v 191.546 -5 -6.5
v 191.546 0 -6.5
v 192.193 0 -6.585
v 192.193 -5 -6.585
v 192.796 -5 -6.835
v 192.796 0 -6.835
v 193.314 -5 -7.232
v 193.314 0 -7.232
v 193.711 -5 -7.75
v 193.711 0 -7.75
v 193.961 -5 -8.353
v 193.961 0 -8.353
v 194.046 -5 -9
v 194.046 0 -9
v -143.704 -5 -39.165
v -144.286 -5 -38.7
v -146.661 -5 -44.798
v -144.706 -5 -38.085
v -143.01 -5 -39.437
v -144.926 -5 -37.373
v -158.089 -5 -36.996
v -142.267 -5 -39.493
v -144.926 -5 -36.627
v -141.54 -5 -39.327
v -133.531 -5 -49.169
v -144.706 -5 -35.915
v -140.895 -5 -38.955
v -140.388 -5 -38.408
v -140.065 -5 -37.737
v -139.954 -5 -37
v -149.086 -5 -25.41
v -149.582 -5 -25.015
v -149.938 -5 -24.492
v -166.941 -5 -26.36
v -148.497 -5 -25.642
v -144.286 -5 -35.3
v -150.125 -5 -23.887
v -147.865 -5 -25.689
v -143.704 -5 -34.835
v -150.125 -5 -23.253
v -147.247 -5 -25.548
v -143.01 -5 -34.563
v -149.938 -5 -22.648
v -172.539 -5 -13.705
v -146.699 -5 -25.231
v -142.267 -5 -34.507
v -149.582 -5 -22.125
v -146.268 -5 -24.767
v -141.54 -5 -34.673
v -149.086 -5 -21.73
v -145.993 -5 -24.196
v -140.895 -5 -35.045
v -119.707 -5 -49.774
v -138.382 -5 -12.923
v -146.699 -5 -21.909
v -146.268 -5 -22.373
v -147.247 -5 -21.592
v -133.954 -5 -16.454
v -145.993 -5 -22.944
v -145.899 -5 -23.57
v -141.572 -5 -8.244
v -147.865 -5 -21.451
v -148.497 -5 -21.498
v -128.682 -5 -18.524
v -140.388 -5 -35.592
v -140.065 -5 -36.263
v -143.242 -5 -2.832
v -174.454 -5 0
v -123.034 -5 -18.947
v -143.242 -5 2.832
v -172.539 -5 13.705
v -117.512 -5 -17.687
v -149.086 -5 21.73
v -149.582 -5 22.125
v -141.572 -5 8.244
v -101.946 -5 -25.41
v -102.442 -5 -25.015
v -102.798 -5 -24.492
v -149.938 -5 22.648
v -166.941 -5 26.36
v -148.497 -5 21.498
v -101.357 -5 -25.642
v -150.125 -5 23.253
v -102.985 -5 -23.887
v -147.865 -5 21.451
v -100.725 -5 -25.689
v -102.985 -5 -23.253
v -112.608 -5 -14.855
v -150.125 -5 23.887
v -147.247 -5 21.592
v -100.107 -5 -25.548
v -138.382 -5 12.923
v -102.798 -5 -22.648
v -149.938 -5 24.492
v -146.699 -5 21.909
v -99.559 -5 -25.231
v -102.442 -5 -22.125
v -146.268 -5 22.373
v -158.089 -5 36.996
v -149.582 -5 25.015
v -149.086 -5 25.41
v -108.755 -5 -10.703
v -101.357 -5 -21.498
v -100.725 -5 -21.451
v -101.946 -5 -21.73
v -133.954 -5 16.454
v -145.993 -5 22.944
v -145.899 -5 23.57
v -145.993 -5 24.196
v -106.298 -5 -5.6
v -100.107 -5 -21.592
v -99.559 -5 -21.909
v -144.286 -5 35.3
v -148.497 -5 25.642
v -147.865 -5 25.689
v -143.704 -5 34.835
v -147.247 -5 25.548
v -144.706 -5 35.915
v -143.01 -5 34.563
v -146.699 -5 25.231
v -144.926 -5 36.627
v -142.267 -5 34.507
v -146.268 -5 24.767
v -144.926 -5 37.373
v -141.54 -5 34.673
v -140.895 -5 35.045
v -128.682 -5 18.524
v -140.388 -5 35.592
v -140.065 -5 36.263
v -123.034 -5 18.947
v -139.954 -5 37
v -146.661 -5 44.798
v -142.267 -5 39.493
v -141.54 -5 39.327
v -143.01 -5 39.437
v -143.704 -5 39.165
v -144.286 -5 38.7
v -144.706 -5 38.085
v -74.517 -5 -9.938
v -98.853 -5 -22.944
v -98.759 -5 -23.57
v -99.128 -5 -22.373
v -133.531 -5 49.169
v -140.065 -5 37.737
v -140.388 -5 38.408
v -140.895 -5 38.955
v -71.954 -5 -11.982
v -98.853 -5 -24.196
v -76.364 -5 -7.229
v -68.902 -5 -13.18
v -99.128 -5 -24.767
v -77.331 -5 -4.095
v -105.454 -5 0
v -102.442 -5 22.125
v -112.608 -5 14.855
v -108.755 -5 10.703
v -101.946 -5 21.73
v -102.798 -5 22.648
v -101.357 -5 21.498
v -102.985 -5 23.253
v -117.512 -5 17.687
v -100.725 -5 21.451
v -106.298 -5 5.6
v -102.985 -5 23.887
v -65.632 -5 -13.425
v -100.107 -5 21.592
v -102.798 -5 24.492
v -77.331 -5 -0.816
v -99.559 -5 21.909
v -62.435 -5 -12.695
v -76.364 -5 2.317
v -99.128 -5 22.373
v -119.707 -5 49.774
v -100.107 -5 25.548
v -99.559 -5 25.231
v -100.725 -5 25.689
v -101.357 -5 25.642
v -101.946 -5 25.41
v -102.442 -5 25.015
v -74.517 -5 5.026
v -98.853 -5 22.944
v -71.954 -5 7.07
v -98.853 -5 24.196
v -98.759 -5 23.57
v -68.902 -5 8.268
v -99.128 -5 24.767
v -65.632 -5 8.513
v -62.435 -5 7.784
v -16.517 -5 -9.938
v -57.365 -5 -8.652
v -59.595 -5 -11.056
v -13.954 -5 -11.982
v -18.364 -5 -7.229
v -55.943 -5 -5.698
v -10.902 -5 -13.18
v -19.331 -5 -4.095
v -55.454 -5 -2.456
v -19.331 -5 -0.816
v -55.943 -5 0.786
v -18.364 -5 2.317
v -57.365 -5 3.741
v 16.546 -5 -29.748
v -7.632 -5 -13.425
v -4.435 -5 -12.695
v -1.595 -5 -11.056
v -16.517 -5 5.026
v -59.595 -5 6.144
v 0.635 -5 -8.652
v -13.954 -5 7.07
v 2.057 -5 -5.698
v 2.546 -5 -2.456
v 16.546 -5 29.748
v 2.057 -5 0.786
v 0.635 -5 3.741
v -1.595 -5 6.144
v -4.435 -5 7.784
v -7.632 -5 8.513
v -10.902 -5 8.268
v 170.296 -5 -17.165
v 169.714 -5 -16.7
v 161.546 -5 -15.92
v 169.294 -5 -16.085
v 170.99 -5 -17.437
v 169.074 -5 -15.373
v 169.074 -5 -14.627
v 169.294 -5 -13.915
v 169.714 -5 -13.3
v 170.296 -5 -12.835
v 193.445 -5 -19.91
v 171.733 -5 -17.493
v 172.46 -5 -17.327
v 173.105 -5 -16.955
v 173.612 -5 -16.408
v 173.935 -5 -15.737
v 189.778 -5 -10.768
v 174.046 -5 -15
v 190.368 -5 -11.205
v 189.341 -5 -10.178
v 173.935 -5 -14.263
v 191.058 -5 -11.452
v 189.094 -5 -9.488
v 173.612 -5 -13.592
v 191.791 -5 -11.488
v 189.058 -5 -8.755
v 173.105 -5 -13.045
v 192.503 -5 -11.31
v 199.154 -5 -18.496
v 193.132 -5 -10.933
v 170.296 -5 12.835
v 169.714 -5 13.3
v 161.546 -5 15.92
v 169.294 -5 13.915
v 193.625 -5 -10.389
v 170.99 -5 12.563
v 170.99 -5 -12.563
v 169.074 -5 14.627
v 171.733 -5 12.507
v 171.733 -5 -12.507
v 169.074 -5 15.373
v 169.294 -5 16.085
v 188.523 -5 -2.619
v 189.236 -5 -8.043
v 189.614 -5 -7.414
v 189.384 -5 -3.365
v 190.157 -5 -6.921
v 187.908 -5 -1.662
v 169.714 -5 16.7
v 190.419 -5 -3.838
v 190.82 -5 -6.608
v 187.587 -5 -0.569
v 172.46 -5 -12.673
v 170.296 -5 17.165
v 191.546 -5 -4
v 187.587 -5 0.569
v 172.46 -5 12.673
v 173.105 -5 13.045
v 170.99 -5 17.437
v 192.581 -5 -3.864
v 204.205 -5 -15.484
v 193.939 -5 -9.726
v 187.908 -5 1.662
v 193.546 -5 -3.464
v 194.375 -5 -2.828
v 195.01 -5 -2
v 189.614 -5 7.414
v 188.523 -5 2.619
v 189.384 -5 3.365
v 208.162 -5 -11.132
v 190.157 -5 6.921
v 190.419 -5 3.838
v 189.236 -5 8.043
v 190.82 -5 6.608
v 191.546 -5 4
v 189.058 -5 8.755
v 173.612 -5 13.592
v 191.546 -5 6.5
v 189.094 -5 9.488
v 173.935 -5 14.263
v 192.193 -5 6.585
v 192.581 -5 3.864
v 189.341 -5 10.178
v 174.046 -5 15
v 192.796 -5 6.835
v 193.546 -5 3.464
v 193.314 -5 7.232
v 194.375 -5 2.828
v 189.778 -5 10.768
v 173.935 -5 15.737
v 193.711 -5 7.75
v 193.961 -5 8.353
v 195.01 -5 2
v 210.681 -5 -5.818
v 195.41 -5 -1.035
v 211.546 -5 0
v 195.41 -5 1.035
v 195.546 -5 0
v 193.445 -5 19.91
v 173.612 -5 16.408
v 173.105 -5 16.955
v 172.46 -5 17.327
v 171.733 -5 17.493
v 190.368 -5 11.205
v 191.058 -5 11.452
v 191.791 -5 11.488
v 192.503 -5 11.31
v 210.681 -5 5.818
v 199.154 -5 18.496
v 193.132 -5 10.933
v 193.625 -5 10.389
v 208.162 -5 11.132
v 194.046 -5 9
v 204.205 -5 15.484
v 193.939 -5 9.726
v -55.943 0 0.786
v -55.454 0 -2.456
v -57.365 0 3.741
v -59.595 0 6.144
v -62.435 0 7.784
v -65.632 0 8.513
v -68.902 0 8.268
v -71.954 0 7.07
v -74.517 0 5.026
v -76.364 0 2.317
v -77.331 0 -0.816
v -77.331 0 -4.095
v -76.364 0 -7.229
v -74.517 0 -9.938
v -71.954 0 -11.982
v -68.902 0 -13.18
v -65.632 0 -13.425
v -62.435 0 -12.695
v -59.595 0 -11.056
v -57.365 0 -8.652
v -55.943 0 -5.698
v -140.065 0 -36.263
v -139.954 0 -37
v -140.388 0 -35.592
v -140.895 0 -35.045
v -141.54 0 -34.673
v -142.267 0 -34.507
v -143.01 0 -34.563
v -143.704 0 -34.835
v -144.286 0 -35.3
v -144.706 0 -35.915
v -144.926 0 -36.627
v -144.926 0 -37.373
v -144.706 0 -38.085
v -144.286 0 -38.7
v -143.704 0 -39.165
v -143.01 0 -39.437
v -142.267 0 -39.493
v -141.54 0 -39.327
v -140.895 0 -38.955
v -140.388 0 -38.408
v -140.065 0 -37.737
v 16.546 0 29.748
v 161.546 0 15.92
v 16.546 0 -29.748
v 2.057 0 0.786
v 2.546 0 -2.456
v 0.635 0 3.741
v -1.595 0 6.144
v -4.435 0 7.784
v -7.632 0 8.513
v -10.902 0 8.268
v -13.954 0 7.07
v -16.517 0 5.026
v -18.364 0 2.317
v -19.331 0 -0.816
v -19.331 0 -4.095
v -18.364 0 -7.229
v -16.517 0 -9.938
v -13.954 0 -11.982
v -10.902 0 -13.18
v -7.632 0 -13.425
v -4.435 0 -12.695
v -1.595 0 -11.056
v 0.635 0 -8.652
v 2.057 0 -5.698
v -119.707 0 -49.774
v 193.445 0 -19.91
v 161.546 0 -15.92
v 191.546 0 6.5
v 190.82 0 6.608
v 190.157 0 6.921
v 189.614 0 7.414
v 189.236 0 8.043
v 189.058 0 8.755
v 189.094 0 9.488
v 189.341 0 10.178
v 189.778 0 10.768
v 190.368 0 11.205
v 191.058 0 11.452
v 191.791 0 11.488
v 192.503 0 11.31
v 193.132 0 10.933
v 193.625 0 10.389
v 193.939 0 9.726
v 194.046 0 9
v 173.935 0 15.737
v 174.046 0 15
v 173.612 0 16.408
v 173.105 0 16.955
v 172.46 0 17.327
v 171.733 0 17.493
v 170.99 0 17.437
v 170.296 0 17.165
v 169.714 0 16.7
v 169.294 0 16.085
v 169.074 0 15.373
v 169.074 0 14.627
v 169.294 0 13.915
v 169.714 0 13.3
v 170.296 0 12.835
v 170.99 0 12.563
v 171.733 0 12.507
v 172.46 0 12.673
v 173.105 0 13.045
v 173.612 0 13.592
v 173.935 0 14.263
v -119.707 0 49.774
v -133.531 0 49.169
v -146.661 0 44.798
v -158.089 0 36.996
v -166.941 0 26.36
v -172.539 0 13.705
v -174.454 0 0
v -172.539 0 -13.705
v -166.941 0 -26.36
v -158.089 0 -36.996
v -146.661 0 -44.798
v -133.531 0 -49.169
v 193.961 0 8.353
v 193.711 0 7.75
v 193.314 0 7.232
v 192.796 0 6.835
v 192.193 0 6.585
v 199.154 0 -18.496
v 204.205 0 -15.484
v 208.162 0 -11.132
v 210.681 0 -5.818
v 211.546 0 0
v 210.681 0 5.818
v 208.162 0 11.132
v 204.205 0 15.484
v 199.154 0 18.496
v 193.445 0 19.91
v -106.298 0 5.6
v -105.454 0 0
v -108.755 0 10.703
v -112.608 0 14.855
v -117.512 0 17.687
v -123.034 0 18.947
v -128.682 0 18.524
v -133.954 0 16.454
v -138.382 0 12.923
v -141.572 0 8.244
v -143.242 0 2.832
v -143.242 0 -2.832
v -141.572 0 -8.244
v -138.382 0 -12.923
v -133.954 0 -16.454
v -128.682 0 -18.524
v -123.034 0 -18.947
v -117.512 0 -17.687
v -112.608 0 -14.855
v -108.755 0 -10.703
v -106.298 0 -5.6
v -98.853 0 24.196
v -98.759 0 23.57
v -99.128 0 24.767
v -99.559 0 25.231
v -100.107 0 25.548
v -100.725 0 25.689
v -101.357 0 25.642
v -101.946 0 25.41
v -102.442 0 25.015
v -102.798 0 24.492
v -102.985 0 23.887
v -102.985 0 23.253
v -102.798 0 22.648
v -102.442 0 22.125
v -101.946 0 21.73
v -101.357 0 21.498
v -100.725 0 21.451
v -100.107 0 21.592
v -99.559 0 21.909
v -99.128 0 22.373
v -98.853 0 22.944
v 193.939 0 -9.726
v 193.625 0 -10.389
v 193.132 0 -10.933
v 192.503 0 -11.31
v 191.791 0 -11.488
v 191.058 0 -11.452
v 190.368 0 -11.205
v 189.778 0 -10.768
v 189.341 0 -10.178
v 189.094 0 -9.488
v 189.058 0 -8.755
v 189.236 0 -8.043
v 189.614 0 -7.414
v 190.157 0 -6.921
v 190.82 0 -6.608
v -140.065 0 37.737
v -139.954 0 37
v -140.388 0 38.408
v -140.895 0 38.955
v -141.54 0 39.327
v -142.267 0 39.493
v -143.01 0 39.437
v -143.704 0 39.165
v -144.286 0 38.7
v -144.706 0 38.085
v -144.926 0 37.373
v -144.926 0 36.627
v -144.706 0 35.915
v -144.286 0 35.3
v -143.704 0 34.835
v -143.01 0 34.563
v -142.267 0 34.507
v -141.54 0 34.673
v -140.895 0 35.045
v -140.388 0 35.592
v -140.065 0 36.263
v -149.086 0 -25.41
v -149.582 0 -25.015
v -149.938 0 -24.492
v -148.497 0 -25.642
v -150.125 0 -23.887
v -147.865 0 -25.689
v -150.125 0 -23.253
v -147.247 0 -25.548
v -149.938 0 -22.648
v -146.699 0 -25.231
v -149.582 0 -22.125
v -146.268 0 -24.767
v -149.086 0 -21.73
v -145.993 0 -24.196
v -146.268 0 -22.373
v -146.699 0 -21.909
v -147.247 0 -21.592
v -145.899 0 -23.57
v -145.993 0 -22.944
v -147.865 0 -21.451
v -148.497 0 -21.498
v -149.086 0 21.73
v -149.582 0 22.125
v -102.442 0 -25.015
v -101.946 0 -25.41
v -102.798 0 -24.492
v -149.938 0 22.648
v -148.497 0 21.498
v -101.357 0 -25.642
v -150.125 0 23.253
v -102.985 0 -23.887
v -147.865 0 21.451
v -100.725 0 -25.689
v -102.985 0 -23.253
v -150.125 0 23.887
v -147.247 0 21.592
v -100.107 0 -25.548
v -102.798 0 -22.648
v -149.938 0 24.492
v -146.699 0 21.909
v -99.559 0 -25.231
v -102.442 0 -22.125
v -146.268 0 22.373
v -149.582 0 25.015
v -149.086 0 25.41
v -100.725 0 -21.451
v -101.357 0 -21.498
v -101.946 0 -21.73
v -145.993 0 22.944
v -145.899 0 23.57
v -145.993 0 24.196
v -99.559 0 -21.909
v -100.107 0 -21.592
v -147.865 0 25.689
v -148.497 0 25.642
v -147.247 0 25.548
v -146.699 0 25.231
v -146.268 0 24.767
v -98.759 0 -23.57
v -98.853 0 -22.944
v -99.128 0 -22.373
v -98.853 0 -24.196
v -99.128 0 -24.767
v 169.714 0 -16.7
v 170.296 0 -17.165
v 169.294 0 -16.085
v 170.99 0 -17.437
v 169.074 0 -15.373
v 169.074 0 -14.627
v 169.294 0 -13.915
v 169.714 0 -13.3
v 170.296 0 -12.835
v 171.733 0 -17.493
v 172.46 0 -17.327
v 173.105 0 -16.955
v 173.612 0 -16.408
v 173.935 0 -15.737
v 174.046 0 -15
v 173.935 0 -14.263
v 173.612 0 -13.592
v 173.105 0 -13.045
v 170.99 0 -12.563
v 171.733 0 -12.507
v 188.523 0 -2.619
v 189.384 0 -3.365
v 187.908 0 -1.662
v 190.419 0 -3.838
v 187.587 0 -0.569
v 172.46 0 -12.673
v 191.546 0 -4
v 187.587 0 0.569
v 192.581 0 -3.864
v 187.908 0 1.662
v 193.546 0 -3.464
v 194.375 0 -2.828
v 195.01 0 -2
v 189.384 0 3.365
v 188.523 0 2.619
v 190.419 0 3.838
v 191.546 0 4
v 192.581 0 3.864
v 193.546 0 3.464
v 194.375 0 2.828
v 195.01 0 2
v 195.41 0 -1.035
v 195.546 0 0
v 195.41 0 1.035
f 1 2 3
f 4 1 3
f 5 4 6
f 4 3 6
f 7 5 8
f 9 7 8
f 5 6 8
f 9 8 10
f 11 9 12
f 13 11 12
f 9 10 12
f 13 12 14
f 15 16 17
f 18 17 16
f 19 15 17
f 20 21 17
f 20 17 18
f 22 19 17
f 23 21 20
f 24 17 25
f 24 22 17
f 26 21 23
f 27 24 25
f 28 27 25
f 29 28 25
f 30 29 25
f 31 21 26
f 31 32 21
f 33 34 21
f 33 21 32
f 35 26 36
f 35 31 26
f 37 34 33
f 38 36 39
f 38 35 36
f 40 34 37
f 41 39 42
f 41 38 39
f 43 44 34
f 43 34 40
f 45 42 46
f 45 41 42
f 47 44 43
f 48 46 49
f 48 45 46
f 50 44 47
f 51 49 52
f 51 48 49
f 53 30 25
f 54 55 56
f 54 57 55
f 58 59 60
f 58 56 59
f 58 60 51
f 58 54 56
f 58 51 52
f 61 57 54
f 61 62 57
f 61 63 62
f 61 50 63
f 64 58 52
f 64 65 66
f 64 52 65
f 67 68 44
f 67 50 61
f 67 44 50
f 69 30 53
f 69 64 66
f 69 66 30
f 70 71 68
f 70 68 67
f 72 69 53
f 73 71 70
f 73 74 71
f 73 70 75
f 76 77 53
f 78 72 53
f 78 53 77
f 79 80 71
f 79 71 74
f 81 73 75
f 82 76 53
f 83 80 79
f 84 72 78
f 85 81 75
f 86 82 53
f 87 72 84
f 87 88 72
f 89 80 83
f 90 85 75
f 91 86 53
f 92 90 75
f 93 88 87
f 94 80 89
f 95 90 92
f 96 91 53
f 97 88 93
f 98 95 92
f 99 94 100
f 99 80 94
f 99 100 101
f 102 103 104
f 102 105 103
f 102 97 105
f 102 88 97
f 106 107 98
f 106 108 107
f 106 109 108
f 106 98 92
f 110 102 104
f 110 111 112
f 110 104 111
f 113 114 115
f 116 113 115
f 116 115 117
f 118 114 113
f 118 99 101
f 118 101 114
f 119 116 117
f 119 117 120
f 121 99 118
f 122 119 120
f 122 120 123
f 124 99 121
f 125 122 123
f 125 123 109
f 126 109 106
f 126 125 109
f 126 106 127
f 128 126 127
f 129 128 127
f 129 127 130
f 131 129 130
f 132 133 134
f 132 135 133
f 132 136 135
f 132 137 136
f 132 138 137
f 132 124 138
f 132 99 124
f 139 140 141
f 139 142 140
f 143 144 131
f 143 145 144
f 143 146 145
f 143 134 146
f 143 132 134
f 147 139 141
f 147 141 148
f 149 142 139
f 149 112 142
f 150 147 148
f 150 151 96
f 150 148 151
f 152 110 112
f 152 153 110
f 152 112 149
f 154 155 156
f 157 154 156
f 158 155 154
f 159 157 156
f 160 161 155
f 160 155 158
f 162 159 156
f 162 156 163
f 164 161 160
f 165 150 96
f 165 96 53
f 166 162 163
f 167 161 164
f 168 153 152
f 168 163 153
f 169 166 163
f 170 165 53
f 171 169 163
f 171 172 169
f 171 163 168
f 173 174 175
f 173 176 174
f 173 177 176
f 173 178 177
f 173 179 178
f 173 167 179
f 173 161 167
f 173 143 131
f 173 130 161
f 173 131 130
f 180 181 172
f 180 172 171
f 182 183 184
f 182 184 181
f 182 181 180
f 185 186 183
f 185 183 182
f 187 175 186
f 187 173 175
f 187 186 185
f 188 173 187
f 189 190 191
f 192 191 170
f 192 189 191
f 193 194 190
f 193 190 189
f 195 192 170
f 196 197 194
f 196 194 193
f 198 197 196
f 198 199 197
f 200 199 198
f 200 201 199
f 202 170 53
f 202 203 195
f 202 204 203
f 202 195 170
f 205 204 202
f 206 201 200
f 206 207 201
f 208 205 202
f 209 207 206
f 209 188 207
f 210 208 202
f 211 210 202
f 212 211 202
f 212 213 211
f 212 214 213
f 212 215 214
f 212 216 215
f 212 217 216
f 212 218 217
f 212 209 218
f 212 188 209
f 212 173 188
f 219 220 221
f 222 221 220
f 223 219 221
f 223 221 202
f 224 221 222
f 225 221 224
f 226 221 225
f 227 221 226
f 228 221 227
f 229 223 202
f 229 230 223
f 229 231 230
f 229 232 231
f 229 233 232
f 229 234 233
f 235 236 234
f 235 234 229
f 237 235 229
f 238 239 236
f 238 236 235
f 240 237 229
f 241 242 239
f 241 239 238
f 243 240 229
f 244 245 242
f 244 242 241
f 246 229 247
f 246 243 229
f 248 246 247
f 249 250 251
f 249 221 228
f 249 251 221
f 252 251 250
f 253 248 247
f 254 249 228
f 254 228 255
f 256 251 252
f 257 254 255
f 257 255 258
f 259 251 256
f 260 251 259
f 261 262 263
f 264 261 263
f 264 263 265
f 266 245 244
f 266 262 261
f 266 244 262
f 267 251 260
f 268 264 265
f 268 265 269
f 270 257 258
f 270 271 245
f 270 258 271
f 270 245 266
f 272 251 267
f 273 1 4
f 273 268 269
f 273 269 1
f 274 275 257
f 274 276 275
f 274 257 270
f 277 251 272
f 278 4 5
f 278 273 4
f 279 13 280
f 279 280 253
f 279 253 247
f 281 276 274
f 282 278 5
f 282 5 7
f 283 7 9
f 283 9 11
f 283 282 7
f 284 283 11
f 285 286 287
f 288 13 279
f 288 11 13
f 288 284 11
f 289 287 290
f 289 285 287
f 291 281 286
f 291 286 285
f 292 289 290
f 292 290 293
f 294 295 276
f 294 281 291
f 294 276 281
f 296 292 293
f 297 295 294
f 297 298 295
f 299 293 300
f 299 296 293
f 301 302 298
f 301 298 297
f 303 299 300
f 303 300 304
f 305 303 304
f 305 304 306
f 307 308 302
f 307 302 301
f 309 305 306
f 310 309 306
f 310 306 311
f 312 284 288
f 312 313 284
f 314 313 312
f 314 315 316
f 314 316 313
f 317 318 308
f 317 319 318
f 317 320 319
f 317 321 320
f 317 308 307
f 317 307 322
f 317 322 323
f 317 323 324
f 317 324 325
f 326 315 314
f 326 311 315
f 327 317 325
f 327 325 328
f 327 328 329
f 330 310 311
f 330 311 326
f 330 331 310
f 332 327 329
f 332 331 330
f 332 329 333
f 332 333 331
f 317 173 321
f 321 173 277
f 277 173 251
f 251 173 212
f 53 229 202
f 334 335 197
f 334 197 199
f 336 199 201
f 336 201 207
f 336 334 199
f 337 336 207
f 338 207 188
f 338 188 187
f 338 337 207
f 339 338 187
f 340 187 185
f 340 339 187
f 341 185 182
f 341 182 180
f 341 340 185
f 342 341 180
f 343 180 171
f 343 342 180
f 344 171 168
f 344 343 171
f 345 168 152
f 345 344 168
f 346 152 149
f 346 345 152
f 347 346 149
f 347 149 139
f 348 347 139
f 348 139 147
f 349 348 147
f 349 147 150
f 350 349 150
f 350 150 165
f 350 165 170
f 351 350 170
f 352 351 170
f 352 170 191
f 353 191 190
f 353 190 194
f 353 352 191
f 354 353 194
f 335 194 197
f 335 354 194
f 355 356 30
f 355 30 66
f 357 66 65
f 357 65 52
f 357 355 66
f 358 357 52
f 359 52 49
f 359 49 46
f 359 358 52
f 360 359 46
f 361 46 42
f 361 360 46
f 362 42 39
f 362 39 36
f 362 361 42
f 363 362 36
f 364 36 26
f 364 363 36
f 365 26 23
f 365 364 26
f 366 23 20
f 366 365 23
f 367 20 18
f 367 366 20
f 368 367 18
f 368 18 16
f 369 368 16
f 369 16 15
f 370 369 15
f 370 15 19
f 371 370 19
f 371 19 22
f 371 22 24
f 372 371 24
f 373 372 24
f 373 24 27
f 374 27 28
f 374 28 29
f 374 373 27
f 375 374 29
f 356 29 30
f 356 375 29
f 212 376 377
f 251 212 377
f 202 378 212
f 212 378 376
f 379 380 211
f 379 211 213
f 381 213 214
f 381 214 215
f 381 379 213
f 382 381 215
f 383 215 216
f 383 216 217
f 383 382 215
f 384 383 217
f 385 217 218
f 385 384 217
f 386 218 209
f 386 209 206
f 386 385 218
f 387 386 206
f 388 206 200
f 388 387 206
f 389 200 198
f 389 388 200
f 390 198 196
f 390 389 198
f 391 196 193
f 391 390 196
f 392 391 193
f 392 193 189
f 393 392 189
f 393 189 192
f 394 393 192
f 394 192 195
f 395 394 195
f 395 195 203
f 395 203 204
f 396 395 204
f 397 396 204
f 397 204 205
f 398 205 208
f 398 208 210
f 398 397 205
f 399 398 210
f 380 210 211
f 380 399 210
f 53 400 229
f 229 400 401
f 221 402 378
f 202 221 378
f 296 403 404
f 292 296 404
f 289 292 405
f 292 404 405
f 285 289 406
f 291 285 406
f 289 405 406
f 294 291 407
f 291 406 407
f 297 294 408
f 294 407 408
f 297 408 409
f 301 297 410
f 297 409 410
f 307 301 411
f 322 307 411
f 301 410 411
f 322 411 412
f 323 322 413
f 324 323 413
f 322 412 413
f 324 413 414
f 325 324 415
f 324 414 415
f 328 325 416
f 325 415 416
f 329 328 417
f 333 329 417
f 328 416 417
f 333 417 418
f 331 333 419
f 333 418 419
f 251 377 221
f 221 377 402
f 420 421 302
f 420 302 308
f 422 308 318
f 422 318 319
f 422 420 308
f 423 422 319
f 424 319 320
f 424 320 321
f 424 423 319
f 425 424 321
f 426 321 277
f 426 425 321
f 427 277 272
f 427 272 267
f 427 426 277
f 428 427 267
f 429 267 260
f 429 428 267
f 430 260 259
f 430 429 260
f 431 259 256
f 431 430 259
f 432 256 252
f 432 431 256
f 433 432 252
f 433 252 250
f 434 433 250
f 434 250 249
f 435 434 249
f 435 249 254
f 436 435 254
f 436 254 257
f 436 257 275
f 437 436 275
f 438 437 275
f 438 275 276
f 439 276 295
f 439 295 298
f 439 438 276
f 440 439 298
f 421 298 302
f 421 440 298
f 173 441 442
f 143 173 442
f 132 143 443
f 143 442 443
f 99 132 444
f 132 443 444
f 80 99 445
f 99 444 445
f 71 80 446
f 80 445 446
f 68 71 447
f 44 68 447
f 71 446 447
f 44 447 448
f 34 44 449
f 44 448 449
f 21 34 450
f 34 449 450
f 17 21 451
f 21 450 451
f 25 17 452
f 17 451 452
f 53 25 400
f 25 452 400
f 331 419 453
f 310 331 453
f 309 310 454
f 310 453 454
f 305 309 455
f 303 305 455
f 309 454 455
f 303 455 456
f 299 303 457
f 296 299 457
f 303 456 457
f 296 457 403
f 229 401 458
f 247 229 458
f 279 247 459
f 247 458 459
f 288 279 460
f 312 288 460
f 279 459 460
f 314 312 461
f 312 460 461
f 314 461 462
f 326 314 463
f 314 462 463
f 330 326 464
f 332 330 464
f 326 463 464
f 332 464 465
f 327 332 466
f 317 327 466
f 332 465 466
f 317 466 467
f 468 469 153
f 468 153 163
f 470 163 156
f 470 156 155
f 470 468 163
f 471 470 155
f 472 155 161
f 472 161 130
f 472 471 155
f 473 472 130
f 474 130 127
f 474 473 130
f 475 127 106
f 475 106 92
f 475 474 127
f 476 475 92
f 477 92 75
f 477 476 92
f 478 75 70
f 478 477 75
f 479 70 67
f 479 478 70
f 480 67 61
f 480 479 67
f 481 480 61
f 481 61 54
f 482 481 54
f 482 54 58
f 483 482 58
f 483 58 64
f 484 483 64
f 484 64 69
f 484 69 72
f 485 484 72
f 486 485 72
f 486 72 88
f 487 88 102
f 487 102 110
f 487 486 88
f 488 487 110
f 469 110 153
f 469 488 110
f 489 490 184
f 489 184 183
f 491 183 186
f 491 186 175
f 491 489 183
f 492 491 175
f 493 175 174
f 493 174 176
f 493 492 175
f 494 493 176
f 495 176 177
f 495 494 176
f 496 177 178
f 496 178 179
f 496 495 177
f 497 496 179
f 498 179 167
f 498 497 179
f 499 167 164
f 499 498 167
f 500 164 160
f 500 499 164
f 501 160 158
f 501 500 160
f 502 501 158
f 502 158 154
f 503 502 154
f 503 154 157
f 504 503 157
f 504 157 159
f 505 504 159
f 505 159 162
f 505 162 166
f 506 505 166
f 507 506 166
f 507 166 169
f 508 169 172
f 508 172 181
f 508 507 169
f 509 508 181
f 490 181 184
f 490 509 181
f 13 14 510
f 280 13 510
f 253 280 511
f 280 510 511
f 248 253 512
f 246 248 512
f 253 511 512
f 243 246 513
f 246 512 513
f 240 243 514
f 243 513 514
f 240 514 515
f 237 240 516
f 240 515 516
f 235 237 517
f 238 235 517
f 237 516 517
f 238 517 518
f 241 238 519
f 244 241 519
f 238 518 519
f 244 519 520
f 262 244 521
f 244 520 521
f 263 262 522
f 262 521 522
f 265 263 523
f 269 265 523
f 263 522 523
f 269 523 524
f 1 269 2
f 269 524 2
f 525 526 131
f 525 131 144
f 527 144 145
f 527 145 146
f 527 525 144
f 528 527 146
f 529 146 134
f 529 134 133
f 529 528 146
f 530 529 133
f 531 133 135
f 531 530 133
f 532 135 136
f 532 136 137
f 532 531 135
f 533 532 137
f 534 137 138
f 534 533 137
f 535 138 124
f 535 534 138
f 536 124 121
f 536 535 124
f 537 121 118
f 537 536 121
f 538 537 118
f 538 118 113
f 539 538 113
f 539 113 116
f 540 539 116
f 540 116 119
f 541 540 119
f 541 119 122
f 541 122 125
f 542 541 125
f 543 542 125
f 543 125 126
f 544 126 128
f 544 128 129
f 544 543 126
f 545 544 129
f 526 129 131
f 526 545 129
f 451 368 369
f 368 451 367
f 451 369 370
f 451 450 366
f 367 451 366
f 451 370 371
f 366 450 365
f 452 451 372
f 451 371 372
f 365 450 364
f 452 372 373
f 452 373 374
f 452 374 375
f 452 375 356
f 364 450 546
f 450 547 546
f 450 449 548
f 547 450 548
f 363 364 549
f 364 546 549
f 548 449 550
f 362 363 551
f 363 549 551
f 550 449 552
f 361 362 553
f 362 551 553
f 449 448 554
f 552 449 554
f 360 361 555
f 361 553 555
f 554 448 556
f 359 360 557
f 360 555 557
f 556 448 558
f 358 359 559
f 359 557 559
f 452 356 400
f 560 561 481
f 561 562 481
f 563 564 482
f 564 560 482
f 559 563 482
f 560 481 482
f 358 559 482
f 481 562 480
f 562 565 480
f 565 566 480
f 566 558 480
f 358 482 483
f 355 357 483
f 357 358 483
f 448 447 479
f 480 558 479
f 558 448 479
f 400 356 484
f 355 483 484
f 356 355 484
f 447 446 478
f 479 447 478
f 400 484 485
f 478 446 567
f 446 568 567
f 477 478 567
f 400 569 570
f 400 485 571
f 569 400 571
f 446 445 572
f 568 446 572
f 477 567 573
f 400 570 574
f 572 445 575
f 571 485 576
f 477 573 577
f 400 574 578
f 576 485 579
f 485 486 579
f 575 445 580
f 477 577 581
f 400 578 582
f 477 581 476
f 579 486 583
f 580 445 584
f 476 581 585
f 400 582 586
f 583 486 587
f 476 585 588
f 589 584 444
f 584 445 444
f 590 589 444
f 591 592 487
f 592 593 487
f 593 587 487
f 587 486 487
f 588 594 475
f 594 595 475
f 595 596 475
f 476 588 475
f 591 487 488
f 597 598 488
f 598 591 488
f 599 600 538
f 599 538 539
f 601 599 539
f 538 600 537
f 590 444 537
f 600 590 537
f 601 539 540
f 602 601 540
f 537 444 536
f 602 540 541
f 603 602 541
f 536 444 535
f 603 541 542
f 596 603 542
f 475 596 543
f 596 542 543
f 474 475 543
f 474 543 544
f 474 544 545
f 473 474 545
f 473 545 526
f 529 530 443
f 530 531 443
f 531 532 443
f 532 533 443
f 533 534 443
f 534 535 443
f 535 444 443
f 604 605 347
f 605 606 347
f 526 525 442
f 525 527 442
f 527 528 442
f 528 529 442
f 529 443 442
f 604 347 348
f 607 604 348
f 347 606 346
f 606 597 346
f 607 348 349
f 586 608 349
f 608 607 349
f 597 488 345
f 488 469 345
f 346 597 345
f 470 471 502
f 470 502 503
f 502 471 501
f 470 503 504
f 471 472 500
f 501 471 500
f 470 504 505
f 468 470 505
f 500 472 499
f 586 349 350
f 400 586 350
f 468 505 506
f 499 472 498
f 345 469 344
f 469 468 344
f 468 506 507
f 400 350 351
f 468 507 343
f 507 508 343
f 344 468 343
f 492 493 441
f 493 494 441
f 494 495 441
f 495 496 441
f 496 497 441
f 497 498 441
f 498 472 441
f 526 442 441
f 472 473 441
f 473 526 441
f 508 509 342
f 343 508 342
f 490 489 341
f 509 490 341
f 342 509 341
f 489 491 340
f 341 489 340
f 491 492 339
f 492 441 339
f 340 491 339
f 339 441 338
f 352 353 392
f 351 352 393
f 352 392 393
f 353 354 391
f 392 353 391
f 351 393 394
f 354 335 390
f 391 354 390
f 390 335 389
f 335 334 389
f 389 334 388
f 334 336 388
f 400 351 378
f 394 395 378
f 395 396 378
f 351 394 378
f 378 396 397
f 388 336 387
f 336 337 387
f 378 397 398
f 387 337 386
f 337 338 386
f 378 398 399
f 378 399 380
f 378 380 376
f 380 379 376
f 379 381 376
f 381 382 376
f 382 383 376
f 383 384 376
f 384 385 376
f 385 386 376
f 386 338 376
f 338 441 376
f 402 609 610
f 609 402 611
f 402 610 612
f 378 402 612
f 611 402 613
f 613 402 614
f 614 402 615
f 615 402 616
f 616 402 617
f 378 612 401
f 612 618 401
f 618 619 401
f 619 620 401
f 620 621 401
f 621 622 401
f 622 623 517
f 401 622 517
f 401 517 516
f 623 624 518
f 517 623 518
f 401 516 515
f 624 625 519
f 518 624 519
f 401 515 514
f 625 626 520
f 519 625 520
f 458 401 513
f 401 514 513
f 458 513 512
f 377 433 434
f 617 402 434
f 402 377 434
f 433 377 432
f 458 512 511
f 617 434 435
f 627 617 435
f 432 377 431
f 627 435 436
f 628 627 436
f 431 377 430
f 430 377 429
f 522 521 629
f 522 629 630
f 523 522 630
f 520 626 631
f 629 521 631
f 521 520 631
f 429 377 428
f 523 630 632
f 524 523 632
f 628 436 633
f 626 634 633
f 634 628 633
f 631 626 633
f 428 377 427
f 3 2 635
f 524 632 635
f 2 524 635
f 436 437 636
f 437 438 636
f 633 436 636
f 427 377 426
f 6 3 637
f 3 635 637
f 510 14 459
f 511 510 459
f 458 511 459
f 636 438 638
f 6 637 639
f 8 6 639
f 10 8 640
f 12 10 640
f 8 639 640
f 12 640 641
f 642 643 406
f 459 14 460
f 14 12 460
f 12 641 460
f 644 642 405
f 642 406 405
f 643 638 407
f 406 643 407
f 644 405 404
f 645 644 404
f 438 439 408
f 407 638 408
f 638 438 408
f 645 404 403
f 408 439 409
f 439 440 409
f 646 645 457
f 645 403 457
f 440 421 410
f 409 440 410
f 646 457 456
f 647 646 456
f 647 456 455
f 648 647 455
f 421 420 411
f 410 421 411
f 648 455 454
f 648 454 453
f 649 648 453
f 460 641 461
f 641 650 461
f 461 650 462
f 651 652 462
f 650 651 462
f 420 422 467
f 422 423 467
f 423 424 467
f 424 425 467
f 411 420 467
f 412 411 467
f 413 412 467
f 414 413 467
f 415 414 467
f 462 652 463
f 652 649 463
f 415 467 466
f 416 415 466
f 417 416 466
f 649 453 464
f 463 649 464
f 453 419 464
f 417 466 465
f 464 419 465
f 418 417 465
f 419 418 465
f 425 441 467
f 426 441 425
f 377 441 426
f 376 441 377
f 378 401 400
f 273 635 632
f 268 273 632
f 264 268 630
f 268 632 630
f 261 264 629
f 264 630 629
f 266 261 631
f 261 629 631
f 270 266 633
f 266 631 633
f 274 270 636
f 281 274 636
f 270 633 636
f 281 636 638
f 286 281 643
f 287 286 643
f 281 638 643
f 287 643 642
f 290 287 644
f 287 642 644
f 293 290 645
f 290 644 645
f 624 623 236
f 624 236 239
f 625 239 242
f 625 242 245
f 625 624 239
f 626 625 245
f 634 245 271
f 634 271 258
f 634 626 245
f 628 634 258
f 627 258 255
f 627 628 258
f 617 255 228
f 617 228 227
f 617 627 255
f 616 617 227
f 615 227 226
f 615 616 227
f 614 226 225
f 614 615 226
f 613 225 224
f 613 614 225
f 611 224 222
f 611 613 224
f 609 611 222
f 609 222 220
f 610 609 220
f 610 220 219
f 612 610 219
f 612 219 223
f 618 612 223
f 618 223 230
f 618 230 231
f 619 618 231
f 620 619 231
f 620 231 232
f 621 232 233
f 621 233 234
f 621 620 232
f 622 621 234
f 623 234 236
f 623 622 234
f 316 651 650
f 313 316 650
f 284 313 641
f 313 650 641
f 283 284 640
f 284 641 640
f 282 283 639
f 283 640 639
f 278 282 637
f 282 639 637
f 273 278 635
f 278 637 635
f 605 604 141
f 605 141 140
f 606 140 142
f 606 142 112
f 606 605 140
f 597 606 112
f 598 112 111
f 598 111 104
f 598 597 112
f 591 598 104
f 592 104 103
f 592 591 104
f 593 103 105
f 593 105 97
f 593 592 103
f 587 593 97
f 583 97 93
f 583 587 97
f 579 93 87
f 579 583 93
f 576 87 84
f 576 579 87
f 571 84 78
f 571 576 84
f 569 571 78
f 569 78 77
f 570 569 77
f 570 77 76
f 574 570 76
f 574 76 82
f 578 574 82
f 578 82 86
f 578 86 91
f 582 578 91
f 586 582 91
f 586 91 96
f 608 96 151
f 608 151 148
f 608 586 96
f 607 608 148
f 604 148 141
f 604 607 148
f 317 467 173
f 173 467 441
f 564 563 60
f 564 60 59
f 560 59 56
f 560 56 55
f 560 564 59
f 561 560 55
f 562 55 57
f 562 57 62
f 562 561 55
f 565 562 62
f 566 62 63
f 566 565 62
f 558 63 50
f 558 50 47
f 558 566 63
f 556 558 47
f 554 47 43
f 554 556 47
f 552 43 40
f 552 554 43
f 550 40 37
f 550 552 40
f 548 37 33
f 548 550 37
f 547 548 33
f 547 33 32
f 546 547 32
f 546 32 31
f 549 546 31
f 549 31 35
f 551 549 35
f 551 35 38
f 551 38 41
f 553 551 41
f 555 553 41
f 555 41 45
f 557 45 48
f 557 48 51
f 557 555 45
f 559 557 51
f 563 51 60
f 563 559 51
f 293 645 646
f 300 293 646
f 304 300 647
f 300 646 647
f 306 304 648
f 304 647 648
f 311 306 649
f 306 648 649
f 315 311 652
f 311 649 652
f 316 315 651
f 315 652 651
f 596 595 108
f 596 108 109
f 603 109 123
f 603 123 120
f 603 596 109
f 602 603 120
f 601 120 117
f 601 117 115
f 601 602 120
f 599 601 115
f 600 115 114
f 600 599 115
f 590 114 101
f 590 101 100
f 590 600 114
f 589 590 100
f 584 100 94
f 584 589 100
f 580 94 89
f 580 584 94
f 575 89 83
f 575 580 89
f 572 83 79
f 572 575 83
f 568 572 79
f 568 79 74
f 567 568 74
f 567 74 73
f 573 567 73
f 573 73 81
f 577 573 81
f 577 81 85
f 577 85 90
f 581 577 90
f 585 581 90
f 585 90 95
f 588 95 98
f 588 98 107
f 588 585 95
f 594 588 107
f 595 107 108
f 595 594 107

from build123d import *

# Parameters (mm, degrees)
F0_R     = 2.5
F0_R_2   = 2.125
F0_R_3   = 11
F0_R_4   = 19
F1_DEPTH = 5


with BuildPart() as f1:
    # F0 (on Front) → F1 (new body)
    with BuildSketch(Plane.XZ):
        with BuildLine():
            Line((193.4449201921, 19.9096662083), (-119.7069785421, 49.7741655206))
            ThreePointArc((-119.7069785421, 49.7741655206), (-174.4538139851, 0), (-119.7069785421, -49.7741655206))
            Line((-119.7069785421, -49.7741655206), (193.4449201921, -19.9096662083))
            ThreePointArc((193.4449201921, -19.9096662083), (211.5461860149, 0), (193.4449201921, 19.9096662083))
        make_face()
        with Locations((-142.4538139851, -37)):
            Circle(F0_R, mode=Mode.SUBTRACT)
        with Locations((-148.0238139851, -23.57)):
            Circle(F0_R_2, mode=Mode.SUBTRACT)
        with Locations((-100.8838139851, -23.57)):
            Circle(F0_R_2, mode=Mode.SUBTRACT)
        with Locations((-66.4538139851, -2.4558089723)):
            Circle(F0_R_3, mode=Mode.SUBTRACT)
        with Locations((-8.4538139851, -2.4558089723)):
            Circle(F0_R_3, mode=Mode.SUBTRACT)
        Polygon((16.5461860149, -29.7482878325), (16.5461860149, 29.7482878325), (161.5461860149, 15.9200069956), (161.5461860149, -15.9200069956), align=None, mode=Mode.SUBTRACT)
        with Locations((171.5461860149, -15)):
            Circle(F0_R, mode=Mode.SUBTRACT)
        with BuildLine():
            ThreePointArc((194.0461860149, -9), (189.7784190619, -10.767766953), (191.5461860149, -6.5))
            ThreePointArc((191.5461860149, -6.5), (193.3139529678, -7.232233047), (194.0461860149, -9))
        make_face(mode=Mode.SUBTRACT)
        with Locations((-124.4538139851, 0)):
            Circle(F0_R_4, mode=Mode.SUBTRACT)
        with Locations((-148.0238139851, 23.57)):
            Circle(F0_R_2, mode=Mode.SUBTRACT)
        with Locations((-100.8838139851, 23.57)):
            Circle(F0_R_2, mode=Mode.SUBTRACT)
        with Locations((-142.4538139851, 37)):
            Circle(F0_R, mode=Mode.SUBTRACT)
        with BuildLine():
            ThreePointArc((191.5461860149, 4), (194.3746131396, 2.8284271247), (195.5461860149, 0))
            ThreePointArc((195.5461860149, 0), (194.3746131396, -2.8284271247), (191.5461860149, -4))
            ThreePointArc((191.5461860149, -4), (187.5461860149, 0), (191.5461860149, 4))
        make_face(mode=Mode.SUBTRACT)
        with BuildLine():
            ThreePointArc((194.0461860149, 9), (193.3139529678, 7.232233047), (191.5461860149, 6.5))
            ThreePointArc((191.5461860149, 6.5), (189.7784190619, 10.767766953), (194.0461860149, 9))
        make_face(mode=Mode.SUBTRACT)
        with Locations((171.5461860149, 15)):
            Circle(F0_R, mode=Mode.SUBTRACT)
    extrude(amount=F1_DEPTH)


solid = f1.part
